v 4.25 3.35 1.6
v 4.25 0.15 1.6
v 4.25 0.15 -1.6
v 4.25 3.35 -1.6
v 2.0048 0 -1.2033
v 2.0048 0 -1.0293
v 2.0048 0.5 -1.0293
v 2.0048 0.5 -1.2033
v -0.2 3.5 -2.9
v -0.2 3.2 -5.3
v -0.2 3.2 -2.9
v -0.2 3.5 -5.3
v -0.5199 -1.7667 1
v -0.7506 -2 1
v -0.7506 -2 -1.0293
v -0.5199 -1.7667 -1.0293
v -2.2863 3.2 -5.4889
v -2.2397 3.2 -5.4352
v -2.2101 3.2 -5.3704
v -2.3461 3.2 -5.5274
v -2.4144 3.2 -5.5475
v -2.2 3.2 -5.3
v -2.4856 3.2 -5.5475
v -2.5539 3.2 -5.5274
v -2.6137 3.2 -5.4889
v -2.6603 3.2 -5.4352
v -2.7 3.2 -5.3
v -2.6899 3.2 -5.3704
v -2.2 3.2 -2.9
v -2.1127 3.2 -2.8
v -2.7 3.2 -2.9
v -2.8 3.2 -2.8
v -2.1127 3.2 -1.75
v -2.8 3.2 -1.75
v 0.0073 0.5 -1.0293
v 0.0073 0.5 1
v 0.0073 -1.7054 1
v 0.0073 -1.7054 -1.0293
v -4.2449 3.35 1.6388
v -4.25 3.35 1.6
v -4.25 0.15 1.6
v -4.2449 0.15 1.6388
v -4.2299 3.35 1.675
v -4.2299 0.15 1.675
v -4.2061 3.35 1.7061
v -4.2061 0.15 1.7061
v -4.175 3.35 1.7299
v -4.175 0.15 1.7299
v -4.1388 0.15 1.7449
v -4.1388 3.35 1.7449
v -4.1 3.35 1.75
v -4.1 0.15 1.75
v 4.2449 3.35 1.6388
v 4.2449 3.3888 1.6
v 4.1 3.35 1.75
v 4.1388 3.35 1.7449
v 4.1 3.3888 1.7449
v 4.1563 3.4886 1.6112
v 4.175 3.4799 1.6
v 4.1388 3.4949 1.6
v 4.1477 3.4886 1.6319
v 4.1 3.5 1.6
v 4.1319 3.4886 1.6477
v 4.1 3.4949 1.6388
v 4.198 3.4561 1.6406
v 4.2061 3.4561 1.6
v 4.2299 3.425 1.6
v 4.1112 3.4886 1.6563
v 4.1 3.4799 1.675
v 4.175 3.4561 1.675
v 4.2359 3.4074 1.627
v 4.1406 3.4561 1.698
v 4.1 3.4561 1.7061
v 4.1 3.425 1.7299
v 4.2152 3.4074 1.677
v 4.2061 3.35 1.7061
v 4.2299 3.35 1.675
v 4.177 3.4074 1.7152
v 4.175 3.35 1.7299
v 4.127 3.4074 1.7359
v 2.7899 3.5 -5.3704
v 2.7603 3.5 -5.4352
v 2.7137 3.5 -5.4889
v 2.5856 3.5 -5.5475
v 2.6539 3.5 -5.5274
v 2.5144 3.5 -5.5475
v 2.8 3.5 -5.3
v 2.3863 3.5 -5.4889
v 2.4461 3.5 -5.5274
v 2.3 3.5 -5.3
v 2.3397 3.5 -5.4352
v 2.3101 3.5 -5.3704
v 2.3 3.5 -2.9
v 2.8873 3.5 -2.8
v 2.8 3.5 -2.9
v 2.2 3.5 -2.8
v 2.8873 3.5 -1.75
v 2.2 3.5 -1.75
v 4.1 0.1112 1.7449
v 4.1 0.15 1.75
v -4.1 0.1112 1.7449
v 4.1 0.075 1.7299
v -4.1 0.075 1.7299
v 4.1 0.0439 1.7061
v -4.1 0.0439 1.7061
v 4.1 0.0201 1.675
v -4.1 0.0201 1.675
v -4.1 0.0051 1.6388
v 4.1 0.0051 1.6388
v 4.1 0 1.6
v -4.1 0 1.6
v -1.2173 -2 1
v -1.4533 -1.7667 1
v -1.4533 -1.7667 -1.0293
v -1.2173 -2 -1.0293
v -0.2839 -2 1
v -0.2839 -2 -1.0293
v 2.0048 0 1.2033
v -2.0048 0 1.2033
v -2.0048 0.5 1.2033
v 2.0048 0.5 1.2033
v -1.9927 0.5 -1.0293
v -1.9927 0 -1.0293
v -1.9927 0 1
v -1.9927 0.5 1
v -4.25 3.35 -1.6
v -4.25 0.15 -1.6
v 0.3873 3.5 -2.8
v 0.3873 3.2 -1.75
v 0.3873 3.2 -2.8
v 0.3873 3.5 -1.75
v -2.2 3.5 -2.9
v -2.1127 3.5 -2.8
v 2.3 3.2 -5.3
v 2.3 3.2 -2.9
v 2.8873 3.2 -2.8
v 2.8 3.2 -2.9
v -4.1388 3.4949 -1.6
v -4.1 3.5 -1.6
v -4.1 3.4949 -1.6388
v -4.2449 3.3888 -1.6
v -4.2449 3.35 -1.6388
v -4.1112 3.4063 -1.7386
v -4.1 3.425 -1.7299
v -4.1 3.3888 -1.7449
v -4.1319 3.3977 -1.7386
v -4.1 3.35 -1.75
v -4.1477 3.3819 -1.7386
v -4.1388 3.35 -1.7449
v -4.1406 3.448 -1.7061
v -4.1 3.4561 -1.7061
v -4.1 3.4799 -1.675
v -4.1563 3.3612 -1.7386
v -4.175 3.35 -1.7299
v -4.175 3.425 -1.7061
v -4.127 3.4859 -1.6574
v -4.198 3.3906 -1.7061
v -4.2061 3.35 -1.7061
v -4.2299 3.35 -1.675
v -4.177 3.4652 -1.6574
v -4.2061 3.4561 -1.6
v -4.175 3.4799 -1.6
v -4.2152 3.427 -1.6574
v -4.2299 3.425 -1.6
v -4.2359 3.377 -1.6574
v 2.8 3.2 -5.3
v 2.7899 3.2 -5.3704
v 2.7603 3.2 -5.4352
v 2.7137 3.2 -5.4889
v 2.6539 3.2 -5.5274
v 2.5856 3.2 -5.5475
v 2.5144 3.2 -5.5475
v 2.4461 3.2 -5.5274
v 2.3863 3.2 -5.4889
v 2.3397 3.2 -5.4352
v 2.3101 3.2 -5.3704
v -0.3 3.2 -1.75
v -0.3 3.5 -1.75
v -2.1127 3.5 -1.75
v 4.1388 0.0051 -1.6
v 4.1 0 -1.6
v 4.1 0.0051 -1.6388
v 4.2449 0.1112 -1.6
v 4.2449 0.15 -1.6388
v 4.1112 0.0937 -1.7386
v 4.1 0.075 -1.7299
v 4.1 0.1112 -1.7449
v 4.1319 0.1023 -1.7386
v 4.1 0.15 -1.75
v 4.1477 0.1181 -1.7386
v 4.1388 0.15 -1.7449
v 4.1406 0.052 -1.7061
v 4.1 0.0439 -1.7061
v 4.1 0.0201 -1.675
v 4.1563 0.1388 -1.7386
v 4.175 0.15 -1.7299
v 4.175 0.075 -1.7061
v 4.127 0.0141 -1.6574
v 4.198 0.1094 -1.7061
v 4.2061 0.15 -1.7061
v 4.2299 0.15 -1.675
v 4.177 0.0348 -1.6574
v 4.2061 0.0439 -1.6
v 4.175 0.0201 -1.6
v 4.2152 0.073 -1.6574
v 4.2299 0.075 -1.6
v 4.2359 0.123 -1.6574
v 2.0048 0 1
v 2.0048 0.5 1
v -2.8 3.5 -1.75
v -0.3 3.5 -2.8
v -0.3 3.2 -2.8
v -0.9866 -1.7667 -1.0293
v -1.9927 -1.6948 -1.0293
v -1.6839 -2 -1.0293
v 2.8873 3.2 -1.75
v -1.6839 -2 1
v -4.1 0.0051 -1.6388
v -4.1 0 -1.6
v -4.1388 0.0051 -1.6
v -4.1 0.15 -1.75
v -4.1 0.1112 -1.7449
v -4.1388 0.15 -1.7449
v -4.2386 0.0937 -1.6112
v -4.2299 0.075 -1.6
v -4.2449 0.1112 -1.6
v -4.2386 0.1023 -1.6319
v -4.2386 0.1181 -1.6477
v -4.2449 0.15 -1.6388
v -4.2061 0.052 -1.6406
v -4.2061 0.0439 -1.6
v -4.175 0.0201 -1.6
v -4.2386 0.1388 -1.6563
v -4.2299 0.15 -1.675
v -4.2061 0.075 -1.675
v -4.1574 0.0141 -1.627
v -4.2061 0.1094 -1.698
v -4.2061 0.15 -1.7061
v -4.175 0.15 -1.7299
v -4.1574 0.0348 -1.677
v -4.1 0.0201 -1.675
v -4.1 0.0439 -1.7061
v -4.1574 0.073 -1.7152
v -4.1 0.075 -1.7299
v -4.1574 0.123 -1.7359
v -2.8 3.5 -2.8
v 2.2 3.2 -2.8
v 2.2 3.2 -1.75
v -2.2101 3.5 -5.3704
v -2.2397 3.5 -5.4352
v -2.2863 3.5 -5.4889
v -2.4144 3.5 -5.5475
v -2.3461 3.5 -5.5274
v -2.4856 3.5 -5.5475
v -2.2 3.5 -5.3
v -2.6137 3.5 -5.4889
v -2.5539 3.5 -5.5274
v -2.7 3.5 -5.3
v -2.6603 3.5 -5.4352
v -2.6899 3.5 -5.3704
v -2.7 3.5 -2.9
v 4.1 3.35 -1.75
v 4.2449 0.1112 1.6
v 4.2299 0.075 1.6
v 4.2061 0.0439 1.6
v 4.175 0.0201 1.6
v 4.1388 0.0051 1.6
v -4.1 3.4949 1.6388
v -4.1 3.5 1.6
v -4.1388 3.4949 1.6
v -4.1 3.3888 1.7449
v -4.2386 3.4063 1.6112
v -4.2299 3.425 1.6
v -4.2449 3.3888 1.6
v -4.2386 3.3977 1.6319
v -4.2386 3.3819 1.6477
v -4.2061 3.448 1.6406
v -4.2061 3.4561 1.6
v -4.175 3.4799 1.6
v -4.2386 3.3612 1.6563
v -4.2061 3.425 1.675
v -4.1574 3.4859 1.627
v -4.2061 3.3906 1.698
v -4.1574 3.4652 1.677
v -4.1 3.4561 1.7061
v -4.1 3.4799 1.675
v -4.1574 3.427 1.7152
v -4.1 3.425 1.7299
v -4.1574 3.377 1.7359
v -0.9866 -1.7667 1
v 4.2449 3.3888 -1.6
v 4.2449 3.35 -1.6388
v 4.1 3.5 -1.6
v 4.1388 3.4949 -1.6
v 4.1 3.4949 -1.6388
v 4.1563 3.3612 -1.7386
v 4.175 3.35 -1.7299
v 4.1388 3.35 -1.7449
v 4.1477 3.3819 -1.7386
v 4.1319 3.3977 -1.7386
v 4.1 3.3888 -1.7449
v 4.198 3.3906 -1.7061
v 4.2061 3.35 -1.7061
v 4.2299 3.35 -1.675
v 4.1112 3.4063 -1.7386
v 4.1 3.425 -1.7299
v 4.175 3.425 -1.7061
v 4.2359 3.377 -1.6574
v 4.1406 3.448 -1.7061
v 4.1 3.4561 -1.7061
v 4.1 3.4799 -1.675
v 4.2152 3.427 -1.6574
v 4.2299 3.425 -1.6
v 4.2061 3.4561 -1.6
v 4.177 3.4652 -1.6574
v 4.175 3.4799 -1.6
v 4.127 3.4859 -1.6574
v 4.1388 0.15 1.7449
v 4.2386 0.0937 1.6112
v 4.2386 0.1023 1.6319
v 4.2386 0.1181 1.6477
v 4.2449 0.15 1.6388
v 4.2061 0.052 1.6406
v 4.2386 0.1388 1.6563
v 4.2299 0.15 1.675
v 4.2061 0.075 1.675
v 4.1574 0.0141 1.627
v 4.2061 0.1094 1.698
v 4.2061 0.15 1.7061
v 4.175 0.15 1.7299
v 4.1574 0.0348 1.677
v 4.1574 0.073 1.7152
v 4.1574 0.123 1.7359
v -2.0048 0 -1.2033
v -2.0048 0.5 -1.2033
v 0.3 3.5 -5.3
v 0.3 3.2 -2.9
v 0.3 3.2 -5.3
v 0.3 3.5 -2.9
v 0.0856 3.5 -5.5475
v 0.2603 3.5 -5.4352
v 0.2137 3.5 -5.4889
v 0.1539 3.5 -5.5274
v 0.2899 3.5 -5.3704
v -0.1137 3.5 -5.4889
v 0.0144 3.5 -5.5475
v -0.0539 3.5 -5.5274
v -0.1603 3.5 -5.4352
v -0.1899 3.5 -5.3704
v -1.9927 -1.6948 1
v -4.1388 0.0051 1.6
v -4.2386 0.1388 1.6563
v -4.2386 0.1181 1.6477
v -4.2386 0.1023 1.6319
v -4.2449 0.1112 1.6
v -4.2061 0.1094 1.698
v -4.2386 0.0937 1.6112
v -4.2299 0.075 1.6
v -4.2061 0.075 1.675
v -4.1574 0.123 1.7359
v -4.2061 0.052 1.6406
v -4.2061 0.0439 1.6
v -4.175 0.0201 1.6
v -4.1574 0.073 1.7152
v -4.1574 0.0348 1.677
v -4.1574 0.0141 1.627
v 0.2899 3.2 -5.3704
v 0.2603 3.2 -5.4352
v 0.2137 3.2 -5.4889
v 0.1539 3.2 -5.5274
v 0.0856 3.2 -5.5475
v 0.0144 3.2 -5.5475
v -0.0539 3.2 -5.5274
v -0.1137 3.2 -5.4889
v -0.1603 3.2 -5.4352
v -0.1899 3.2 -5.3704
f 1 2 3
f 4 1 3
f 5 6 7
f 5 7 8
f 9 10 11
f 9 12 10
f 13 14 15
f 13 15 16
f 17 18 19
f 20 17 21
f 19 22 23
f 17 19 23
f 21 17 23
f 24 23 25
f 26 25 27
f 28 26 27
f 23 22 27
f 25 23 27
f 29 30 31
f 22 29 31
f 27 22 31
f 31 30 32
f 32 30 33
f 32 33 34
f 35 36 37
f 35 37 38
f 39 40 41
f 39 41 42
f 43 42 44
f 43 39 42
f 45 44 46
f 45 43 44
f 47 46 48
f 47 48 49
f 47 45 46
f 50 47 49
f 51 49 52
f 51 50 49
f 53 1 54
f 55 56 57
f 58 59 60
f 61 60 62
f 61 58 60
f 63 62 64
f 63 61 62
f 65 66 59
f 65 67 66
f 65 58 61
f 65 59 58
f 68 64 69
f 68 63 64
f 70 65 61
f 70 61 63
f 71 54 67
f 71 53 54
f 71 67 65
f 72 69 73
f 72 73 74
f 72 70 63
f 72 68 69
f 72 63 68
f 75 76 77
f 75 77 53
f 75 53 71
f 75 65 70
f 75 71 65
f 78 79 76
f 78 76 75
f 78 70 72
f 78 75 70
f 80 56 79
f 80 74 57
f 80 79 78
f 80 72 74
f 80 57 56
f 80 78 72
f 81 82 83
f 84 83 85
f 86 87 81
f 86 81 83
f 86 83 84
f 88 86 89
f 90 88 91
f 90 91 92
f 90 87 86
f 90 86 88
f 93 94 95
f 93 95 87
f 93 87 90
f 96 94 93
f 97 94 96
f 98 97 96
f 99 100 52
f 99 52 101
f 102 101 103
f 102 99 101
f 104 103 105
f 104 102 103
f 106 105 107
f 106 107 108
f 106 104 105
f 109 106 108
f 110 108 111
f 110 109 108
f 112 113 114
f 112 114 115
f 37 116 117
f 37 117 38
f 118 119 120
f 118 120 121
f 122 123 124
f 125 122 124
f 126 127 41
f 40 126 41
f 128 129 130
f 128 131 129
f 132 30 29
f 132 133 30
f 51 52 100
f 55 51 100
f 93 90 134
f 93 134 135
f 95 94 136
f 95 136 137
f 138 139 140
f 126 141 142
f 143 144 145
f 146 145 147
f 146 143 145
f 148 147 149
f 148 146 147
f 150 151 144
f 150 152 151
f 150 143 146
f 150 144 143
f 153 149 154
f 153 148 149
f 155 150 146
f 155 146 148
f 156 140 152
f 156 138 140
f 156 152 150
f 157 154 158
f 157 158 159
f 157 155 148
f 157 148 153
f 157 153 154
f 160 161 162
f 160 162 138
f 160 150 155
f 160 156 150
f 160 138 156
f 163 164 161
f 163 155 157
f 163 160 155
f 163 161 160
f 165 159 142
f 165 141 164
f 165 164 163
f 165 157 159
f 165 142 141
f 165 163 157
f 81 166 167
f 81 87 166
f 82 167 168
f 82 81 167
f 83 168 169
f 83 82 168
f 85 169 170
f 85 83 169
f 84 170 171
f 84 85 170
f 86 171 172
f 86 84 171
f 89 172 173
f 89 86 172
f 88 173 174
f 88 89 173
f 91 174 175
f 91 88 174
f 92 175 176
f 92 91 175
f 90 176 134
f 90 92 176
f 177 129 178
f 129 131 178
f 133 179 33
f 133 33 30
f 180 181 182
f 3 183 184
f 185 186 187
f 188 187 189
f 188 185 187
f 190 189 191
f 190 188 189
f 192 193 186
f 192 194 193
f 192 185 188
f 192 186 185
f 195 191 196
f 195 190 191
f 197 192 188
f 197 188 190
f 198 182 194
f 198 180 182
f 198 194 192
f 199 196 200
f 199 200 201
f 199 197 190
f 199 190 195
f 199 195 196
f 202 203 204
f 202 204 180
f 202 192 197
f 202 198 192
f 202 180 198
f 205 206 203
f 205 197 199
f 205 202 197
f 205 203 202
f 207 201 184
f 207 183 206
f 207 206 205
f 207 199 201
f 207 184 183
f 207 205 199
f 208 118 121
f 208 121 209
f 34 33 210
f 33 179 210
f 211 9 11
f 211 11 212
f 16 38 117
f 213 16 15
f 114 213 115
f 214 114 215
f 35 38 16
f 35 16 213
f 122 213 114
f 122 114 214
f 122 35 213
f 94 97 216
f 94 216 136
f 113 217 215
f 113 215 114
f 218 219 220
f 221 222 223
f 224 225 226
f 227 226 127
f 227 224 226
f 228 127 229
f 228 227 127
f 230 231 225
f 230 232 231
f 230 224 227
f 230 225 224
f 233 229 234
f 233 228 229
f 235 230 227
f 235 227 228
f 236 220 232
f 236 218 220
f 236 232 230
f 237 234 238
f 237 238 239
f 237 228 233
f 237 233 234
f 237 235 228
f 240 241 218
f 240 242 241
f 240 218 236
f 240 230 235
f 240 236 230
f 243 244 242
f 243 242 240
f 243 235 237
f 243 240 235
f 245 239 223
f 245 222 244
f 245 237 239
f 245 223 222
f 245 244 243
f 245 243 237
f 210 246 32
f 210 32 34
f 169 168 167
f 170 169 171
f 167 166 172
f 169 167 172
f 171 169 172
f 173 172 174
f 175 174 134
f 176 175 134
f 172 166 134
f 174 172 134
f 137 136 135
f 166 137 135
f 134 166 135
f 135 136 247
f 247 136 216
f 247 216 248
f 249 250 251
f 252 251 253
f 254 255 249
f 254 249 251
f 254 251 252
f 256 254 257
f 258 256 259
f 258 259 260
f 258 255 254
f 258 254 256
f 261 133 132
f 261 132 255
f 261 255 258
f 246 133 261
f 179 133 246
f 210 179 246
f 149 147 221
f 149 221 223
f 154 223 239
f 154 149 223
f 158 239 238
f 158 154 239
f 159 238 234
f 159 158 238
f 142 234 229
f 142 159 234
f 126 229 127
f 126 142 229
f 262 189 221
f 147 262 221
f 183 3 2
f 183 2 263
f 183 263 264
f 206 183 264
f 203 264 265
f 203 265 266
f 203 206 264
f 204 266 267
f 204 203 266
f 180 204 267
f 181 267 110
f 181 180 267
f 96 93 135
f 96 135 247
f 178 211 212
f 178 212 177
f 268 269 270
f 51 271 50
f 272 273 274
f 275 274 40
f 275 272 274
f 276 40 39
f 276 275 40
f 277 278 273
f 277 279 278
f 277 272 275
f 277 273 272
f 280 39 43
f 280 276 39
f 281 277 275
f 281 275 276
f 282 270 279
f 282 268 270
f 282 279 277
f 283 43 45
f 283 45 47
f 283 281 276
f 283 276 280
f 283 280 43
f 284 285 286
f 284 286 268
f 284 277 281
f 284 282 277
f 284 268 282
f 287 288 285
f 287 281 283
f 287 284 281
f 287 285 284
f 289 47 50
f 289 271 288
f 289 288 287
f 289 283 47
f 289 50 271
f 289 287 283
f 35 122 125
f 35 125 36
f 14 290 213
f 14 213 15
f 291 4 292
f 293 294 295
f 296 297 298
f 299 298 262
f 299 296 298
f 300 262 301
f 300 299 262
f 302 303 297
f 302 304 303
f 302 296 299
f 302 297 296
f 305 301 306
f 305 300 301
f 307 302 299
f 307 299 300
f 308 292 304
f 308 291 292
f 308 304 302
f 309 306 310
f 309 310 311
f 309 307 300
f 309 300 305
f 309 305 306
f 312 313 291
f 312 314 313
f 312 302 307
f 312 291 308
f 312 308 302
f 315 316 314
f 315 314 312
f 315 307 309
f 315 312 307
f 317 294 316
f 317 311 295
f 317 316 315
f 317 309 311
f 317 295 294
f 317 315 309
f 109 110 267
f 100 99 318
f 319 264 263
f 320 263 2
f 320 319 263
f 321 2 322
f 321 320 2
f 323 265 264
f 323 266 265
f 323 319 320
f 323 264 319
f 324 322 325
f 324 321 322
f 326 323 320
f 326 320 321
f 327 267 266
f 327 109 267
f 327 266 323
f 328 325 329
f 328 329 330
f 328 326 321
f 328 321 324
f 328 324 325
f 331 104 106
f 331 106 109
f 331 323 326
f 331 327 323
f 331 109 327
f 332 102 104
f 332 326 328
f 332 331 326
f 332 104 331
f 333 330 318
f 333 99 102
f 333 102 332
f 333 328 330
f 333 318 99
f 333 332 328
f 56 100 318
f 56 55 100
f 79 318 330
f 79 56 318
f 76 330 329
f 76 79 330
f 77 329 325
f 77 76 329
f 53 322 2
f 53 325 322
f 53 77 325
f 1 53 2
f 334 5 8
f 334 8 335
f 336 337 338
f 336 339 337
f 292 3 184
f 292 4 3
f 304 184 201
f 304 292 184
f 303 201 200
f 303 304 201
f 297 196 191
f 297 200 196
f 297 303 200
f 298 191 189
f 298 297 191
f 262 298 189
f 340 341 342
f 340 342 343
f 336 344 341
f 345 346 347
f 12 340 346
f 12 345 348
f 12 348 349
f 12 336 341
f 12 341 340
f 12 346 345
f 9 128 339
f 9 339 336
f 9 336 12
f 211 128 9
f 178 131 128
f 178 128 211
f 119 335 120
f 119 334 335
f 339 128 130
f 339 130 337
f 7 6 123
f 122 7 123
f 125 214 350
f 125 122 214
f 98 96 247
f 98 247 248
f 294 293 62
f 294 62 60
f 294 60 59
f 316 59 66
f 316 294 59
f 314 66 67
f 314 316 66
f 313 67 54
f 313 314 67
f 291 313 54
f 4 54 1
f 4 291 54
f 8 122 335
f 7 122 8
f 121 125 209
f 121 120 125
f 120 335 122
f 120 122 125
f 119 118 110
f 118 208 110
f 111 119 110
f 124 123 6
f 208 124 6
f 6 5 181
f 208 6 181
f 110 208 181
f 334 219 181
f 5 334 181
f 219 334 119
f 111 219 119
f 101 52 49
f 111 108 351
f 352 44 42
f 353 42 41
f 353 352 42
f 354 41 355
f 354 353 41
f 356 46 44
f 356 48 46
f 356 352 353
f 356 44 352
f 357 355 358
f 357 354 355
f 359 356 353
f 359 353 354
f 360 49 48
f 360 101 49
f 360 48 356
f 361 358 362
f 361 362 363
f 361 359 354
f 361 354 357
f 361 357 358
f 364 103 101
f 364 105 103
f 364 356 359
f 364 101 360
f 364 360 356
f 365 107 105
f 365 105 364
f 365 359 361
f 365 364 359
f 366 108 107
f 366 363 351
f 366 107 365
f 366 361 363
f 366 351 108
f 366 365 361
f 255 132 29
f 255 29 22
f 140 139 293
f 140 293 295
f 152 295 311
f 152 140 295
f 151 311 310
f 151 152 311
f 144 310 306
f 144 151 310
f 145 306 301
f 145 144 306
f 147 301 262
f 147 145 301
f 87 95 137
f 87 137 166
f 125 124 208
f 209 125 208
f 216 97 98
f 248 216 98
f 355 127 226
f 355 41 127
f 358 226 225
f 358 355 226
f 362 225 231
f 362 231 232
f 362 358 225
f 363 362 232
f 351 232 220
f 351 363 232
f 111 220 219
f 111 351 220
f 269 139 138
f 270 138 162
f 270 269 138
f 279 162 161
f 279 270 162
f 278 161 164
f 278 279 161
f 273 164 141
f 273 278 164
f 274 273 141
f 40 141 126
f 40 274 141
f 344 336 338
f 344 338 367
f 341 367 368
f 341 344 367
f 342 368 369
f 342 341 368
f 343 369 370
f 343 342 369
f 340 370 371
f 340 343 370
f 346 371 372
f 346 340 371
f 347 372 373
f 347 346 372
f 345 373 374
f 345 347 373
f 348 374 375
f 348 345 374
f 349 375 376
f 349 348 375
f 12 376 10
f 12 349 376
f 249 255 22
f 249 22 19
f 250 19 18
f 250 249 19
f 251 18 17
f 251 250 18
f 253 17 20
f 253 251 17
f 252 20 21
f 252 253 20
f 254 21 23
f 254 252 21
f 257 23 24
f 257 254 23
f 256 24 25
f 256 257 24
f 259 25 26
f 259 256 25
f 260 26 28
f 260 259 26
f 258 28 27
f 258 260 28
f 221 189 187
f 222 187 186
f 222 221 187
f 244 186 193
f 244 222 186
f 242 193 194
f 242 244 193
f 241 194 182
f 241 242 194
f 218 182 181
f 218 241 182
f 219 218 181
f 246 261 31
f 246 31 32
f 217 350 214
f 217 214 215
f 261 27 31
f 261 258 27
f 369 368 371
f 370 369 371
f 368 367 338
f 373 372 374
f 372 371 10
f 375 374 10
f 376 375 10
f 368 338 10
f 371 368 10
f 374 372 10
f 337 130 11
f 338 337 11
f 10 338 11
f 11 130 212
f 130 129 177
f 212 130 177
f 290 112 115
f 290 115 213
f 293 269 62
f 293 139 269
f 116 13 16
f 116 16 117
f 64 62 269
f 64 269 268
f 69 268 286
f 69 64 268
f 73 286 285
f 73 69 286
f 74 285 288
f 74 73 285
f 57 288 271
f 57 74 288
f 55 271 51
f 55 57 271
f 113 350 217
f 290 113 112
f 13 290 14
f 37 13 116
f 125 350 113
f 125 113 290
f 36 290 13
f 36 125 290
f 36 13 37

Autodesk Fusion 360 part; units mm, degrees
sketch "Sketch1" plane through (0, 0, 0) normal (0, 1, 0) x (1, 0, 0)
  line L0 (4.25, 1.75) -> (-4.25, 1.75)
  line L1 (-4.25, 1.75) -> (-4.25, -1.75)
  line L2 (-4.25, -1.75) -> (4.25, -1.75)
  line L3 (4.25, -1.75) -> (4.25, 1.75)
  line L4 (4.25, 1.75) -> (-4.25, -1.75) construction
  line L5 (-4.25, 1.75) -> (4.25, -1.75) construction
  dimension "d1" = 8.5
  dimension "d2" = 3.5
extrude "Extrude1" add sketch "Sketch1" along normal blind 3.5 makes body 1
sketch "Sketch3" plane through (0, 0, 0) normal (0, -1, 0) x (1, 0, 0)
  line L0 (4.25, -1.75) -> (4.25, 1.75)
  line L1 (4.25, 1.75) -> (-4.25, 1.75)
  line L2 (-4.25, 1.75) -> (-4.25, -1.75)
  line L3 (-4.25, -1.75) -> (4.25, -1.75)
  line L4 (2.0048, -1.2033) -> (-2.0048, -1.2033)
  line L5 (-2.0048, -1.2033) -> (-2.0048, 1.2033)
  line L6 (-2.0048, 1.2033) -> (2.0048, 1.2033)
  line L7 (2.0048, 1.2033) -> (2.0048, -1.2033)
  line L8 (2.0048, -1.2033) -> (-2.0048, 1.2033) construction
  line L9 (-2.0048, -1.2033) -> (2.0048, 1.2033) construction
  line L10 (0.0073, -1.0293) -> (-1.9927, -1.0293)
  line L11 (-1.9927, -1.0293) -> (-1.9927, 1)
  line L12 (-1.9927, 1) -> (0.0073, 1)
  line L13 (0.0073, 1) -> (0.0073, -1.0293)
  dimension "d7" = 2
extrude "Extrude2" cut sketch "Sketch3" against normal blind 0.5 contours L4 L5 L6 L7 bodies 1
extrude "Extrude3" add 1 faces at (-0.6593, 0, 0.3236) along direction (0, -1, 0) blind 2 and the other way blind 0.5 separate body on bodies 1 makes body 2
sketch "Sketch4" plane through (0, 3.5, 0) normal (0, 1, 0) x (-1, 0, 0)
  line L0 (-4.25, 1.75) -> (-4.25, -1.75)
  line L1 (-4.25, -1.75) -> (4.25, -1.75)
  line L2 (4.25, -1.75) -> (4.25, 1.75)
  line L3 (4.25, 1.75) -> (-4.25, 1.75)
  line L4 (-2.8873, -1.75) -> (-2.8873, -2.8)
  line L5 (-2.8873, -2.8) -> (-2.8, -2.9)
  line L6 (-2.8, -2.9) -> (-2.8, -5.3)
  arc A0 (-2.8, -5.3) -> (-2.3, -5.3) centre (-2.55, -5.3) ccw
  line L7 (-2.3, -5.3) -> (-2.3, -2.9)
  line L8 (-2.3, -2.9) -> (-2.2, -2.8)
  line L9 (-2.2, -2.8) -> (-2.2, -1.75)
  line L10 (-2.8873, -1.75) -> (-2.2, -1.75)
  line L11 (-0.3873, -1.75) -> (0.3, -1.75)
  line L12 (-0.3873, -1.75) -> (-0.3873, -2.8)
  line L13 (-0.3873, -2.8) -> (-0.3, -2.9)
  line L14 (-0.3, -2.9) -> (-0.3, -5.3)
  arc A1 (-0.3, -5.3) -> (0.2, -5.3) centre (-0.05, -5.3) ccw
  line L15 (0.2, -5.3) -> (0.2, -2.9)
  line L16 (0.2, -2.9) -> (0.3, -2.8)
  line L17 (0.3, -2.8) -> (0.3, -1.75)
  line L18 (2.1127, -1.75) -> (2.8, -1.75)
  line L19 (2.1127, -1.75) -> (2.1127, -2.8)
  line L20 (2.1127, -2.8) -> (2.2, -2.9)
  line L21 (2.2, -2.9) -> (2.2, -5.3)
  arc A2 (2.2, -5.3) -> (2.7, -5.3) centre (2.45, -5.3) ccw
  line L22 (2.7, -5.3) -> (2.7, -2.9)
  line L23 (2.7, -2.9) -> (2.8, -2.8)
  line L24 (2.8, -2.8) -> (2.8, -1.75)
  dimension "d14" = 0.5
  dimension "d17" = 5
  dimension "d18" = 0
extrude "Extrude4" add sketch "Sketch4" against normal blind 0.3 separate body contours L1 L4 L5 L6 A0 L7 L8 L9 L10 | L1 L18 L19 L20 L21 A2 L22 L23 L24 | L1 L11 L12 L13 L14 A1 L15 L16 L17 makes body 3 at (2.6582, 3.5, -2.1) makes body 4 at (0.1582, 3.5, -2.1) makes body 5 at (-2.3418, 3.5, -2.1)
sketch "Sketch5" plane through (0, 0, 1) normal (0, 0, 1) x (-1, 0, 0)
  line L0 (1.9927, -0.5) -> (1.9927, 2)
  line L1 (1.9927, 2) -> (-0.0073, 2)
  line L2 (-0.0073, 2) -> (-0.0073, -0.5)
  line L3 (-0.0073, -0.5) -> (1.9927, -0.5)
  line L4 (1.9927, 2) -> (-0.0073, 2)
  line L5 (-0.0073, 2) -> (-0.0073, 1.6948)
  line L6 (-0.0073, 1.6948) -> (1.9927, 1.6948)
  line L7 (1.9927, 1.6948) -> (1.9927, 2)
  line L8 (1.9927, 1.6948) -> (1.6839, 2)
  line L9 (1.6839, 2) -> (1.3822, 1.6948)
  line L10 (1.526, 1.6948) -> (1.2173, 2)
  line L11 (1.2173, 2) -> (0.9155, 1.6948)
  line L12 (1.0593, 1.6948) -> (0.7506, 2)
  line L13 (0.7506, 2) -> (0.4488, 1.6948)
  line L14 (0.5927, 1.6948) -> (0.2839, 2)
  line L15 (0.2839, 2) -> (-0.0178, 1.6948)
  dimension "d23" = -1.4
  dimension "d24" = 0
extrude "Extrude5" cut sketch "Sketch5" against normal blind 2.5 contours L0 L1 L4 L7 L8 | L1 L4 L9 L10 | L1 L4 L11 L12 | L1 L2 L4 L5 L15 | L1 L4 L13 L14 bodies 2
delete_face "DeleteFace1" 1 faces at (0.0073, 0.1667, 0.3236) on bodies 1
fillet "Fillet1" radius 0.15 12 edges at (0, 0, 1.75) (4.25, 1.75, 1.75) (0, 3.5, 1.75) (-4.25, 1.75, 1.75) (4.25, 0, 0) (4.25, 3.5, 0) (4.25, 1.75, -1.75) (0, 0, -1.75) (-4.25, 0, 0) (-4.25, 3.5, 0) (-4.25, 1.75, -1.75) (0, 3.5, -1.75) on bodies 1
